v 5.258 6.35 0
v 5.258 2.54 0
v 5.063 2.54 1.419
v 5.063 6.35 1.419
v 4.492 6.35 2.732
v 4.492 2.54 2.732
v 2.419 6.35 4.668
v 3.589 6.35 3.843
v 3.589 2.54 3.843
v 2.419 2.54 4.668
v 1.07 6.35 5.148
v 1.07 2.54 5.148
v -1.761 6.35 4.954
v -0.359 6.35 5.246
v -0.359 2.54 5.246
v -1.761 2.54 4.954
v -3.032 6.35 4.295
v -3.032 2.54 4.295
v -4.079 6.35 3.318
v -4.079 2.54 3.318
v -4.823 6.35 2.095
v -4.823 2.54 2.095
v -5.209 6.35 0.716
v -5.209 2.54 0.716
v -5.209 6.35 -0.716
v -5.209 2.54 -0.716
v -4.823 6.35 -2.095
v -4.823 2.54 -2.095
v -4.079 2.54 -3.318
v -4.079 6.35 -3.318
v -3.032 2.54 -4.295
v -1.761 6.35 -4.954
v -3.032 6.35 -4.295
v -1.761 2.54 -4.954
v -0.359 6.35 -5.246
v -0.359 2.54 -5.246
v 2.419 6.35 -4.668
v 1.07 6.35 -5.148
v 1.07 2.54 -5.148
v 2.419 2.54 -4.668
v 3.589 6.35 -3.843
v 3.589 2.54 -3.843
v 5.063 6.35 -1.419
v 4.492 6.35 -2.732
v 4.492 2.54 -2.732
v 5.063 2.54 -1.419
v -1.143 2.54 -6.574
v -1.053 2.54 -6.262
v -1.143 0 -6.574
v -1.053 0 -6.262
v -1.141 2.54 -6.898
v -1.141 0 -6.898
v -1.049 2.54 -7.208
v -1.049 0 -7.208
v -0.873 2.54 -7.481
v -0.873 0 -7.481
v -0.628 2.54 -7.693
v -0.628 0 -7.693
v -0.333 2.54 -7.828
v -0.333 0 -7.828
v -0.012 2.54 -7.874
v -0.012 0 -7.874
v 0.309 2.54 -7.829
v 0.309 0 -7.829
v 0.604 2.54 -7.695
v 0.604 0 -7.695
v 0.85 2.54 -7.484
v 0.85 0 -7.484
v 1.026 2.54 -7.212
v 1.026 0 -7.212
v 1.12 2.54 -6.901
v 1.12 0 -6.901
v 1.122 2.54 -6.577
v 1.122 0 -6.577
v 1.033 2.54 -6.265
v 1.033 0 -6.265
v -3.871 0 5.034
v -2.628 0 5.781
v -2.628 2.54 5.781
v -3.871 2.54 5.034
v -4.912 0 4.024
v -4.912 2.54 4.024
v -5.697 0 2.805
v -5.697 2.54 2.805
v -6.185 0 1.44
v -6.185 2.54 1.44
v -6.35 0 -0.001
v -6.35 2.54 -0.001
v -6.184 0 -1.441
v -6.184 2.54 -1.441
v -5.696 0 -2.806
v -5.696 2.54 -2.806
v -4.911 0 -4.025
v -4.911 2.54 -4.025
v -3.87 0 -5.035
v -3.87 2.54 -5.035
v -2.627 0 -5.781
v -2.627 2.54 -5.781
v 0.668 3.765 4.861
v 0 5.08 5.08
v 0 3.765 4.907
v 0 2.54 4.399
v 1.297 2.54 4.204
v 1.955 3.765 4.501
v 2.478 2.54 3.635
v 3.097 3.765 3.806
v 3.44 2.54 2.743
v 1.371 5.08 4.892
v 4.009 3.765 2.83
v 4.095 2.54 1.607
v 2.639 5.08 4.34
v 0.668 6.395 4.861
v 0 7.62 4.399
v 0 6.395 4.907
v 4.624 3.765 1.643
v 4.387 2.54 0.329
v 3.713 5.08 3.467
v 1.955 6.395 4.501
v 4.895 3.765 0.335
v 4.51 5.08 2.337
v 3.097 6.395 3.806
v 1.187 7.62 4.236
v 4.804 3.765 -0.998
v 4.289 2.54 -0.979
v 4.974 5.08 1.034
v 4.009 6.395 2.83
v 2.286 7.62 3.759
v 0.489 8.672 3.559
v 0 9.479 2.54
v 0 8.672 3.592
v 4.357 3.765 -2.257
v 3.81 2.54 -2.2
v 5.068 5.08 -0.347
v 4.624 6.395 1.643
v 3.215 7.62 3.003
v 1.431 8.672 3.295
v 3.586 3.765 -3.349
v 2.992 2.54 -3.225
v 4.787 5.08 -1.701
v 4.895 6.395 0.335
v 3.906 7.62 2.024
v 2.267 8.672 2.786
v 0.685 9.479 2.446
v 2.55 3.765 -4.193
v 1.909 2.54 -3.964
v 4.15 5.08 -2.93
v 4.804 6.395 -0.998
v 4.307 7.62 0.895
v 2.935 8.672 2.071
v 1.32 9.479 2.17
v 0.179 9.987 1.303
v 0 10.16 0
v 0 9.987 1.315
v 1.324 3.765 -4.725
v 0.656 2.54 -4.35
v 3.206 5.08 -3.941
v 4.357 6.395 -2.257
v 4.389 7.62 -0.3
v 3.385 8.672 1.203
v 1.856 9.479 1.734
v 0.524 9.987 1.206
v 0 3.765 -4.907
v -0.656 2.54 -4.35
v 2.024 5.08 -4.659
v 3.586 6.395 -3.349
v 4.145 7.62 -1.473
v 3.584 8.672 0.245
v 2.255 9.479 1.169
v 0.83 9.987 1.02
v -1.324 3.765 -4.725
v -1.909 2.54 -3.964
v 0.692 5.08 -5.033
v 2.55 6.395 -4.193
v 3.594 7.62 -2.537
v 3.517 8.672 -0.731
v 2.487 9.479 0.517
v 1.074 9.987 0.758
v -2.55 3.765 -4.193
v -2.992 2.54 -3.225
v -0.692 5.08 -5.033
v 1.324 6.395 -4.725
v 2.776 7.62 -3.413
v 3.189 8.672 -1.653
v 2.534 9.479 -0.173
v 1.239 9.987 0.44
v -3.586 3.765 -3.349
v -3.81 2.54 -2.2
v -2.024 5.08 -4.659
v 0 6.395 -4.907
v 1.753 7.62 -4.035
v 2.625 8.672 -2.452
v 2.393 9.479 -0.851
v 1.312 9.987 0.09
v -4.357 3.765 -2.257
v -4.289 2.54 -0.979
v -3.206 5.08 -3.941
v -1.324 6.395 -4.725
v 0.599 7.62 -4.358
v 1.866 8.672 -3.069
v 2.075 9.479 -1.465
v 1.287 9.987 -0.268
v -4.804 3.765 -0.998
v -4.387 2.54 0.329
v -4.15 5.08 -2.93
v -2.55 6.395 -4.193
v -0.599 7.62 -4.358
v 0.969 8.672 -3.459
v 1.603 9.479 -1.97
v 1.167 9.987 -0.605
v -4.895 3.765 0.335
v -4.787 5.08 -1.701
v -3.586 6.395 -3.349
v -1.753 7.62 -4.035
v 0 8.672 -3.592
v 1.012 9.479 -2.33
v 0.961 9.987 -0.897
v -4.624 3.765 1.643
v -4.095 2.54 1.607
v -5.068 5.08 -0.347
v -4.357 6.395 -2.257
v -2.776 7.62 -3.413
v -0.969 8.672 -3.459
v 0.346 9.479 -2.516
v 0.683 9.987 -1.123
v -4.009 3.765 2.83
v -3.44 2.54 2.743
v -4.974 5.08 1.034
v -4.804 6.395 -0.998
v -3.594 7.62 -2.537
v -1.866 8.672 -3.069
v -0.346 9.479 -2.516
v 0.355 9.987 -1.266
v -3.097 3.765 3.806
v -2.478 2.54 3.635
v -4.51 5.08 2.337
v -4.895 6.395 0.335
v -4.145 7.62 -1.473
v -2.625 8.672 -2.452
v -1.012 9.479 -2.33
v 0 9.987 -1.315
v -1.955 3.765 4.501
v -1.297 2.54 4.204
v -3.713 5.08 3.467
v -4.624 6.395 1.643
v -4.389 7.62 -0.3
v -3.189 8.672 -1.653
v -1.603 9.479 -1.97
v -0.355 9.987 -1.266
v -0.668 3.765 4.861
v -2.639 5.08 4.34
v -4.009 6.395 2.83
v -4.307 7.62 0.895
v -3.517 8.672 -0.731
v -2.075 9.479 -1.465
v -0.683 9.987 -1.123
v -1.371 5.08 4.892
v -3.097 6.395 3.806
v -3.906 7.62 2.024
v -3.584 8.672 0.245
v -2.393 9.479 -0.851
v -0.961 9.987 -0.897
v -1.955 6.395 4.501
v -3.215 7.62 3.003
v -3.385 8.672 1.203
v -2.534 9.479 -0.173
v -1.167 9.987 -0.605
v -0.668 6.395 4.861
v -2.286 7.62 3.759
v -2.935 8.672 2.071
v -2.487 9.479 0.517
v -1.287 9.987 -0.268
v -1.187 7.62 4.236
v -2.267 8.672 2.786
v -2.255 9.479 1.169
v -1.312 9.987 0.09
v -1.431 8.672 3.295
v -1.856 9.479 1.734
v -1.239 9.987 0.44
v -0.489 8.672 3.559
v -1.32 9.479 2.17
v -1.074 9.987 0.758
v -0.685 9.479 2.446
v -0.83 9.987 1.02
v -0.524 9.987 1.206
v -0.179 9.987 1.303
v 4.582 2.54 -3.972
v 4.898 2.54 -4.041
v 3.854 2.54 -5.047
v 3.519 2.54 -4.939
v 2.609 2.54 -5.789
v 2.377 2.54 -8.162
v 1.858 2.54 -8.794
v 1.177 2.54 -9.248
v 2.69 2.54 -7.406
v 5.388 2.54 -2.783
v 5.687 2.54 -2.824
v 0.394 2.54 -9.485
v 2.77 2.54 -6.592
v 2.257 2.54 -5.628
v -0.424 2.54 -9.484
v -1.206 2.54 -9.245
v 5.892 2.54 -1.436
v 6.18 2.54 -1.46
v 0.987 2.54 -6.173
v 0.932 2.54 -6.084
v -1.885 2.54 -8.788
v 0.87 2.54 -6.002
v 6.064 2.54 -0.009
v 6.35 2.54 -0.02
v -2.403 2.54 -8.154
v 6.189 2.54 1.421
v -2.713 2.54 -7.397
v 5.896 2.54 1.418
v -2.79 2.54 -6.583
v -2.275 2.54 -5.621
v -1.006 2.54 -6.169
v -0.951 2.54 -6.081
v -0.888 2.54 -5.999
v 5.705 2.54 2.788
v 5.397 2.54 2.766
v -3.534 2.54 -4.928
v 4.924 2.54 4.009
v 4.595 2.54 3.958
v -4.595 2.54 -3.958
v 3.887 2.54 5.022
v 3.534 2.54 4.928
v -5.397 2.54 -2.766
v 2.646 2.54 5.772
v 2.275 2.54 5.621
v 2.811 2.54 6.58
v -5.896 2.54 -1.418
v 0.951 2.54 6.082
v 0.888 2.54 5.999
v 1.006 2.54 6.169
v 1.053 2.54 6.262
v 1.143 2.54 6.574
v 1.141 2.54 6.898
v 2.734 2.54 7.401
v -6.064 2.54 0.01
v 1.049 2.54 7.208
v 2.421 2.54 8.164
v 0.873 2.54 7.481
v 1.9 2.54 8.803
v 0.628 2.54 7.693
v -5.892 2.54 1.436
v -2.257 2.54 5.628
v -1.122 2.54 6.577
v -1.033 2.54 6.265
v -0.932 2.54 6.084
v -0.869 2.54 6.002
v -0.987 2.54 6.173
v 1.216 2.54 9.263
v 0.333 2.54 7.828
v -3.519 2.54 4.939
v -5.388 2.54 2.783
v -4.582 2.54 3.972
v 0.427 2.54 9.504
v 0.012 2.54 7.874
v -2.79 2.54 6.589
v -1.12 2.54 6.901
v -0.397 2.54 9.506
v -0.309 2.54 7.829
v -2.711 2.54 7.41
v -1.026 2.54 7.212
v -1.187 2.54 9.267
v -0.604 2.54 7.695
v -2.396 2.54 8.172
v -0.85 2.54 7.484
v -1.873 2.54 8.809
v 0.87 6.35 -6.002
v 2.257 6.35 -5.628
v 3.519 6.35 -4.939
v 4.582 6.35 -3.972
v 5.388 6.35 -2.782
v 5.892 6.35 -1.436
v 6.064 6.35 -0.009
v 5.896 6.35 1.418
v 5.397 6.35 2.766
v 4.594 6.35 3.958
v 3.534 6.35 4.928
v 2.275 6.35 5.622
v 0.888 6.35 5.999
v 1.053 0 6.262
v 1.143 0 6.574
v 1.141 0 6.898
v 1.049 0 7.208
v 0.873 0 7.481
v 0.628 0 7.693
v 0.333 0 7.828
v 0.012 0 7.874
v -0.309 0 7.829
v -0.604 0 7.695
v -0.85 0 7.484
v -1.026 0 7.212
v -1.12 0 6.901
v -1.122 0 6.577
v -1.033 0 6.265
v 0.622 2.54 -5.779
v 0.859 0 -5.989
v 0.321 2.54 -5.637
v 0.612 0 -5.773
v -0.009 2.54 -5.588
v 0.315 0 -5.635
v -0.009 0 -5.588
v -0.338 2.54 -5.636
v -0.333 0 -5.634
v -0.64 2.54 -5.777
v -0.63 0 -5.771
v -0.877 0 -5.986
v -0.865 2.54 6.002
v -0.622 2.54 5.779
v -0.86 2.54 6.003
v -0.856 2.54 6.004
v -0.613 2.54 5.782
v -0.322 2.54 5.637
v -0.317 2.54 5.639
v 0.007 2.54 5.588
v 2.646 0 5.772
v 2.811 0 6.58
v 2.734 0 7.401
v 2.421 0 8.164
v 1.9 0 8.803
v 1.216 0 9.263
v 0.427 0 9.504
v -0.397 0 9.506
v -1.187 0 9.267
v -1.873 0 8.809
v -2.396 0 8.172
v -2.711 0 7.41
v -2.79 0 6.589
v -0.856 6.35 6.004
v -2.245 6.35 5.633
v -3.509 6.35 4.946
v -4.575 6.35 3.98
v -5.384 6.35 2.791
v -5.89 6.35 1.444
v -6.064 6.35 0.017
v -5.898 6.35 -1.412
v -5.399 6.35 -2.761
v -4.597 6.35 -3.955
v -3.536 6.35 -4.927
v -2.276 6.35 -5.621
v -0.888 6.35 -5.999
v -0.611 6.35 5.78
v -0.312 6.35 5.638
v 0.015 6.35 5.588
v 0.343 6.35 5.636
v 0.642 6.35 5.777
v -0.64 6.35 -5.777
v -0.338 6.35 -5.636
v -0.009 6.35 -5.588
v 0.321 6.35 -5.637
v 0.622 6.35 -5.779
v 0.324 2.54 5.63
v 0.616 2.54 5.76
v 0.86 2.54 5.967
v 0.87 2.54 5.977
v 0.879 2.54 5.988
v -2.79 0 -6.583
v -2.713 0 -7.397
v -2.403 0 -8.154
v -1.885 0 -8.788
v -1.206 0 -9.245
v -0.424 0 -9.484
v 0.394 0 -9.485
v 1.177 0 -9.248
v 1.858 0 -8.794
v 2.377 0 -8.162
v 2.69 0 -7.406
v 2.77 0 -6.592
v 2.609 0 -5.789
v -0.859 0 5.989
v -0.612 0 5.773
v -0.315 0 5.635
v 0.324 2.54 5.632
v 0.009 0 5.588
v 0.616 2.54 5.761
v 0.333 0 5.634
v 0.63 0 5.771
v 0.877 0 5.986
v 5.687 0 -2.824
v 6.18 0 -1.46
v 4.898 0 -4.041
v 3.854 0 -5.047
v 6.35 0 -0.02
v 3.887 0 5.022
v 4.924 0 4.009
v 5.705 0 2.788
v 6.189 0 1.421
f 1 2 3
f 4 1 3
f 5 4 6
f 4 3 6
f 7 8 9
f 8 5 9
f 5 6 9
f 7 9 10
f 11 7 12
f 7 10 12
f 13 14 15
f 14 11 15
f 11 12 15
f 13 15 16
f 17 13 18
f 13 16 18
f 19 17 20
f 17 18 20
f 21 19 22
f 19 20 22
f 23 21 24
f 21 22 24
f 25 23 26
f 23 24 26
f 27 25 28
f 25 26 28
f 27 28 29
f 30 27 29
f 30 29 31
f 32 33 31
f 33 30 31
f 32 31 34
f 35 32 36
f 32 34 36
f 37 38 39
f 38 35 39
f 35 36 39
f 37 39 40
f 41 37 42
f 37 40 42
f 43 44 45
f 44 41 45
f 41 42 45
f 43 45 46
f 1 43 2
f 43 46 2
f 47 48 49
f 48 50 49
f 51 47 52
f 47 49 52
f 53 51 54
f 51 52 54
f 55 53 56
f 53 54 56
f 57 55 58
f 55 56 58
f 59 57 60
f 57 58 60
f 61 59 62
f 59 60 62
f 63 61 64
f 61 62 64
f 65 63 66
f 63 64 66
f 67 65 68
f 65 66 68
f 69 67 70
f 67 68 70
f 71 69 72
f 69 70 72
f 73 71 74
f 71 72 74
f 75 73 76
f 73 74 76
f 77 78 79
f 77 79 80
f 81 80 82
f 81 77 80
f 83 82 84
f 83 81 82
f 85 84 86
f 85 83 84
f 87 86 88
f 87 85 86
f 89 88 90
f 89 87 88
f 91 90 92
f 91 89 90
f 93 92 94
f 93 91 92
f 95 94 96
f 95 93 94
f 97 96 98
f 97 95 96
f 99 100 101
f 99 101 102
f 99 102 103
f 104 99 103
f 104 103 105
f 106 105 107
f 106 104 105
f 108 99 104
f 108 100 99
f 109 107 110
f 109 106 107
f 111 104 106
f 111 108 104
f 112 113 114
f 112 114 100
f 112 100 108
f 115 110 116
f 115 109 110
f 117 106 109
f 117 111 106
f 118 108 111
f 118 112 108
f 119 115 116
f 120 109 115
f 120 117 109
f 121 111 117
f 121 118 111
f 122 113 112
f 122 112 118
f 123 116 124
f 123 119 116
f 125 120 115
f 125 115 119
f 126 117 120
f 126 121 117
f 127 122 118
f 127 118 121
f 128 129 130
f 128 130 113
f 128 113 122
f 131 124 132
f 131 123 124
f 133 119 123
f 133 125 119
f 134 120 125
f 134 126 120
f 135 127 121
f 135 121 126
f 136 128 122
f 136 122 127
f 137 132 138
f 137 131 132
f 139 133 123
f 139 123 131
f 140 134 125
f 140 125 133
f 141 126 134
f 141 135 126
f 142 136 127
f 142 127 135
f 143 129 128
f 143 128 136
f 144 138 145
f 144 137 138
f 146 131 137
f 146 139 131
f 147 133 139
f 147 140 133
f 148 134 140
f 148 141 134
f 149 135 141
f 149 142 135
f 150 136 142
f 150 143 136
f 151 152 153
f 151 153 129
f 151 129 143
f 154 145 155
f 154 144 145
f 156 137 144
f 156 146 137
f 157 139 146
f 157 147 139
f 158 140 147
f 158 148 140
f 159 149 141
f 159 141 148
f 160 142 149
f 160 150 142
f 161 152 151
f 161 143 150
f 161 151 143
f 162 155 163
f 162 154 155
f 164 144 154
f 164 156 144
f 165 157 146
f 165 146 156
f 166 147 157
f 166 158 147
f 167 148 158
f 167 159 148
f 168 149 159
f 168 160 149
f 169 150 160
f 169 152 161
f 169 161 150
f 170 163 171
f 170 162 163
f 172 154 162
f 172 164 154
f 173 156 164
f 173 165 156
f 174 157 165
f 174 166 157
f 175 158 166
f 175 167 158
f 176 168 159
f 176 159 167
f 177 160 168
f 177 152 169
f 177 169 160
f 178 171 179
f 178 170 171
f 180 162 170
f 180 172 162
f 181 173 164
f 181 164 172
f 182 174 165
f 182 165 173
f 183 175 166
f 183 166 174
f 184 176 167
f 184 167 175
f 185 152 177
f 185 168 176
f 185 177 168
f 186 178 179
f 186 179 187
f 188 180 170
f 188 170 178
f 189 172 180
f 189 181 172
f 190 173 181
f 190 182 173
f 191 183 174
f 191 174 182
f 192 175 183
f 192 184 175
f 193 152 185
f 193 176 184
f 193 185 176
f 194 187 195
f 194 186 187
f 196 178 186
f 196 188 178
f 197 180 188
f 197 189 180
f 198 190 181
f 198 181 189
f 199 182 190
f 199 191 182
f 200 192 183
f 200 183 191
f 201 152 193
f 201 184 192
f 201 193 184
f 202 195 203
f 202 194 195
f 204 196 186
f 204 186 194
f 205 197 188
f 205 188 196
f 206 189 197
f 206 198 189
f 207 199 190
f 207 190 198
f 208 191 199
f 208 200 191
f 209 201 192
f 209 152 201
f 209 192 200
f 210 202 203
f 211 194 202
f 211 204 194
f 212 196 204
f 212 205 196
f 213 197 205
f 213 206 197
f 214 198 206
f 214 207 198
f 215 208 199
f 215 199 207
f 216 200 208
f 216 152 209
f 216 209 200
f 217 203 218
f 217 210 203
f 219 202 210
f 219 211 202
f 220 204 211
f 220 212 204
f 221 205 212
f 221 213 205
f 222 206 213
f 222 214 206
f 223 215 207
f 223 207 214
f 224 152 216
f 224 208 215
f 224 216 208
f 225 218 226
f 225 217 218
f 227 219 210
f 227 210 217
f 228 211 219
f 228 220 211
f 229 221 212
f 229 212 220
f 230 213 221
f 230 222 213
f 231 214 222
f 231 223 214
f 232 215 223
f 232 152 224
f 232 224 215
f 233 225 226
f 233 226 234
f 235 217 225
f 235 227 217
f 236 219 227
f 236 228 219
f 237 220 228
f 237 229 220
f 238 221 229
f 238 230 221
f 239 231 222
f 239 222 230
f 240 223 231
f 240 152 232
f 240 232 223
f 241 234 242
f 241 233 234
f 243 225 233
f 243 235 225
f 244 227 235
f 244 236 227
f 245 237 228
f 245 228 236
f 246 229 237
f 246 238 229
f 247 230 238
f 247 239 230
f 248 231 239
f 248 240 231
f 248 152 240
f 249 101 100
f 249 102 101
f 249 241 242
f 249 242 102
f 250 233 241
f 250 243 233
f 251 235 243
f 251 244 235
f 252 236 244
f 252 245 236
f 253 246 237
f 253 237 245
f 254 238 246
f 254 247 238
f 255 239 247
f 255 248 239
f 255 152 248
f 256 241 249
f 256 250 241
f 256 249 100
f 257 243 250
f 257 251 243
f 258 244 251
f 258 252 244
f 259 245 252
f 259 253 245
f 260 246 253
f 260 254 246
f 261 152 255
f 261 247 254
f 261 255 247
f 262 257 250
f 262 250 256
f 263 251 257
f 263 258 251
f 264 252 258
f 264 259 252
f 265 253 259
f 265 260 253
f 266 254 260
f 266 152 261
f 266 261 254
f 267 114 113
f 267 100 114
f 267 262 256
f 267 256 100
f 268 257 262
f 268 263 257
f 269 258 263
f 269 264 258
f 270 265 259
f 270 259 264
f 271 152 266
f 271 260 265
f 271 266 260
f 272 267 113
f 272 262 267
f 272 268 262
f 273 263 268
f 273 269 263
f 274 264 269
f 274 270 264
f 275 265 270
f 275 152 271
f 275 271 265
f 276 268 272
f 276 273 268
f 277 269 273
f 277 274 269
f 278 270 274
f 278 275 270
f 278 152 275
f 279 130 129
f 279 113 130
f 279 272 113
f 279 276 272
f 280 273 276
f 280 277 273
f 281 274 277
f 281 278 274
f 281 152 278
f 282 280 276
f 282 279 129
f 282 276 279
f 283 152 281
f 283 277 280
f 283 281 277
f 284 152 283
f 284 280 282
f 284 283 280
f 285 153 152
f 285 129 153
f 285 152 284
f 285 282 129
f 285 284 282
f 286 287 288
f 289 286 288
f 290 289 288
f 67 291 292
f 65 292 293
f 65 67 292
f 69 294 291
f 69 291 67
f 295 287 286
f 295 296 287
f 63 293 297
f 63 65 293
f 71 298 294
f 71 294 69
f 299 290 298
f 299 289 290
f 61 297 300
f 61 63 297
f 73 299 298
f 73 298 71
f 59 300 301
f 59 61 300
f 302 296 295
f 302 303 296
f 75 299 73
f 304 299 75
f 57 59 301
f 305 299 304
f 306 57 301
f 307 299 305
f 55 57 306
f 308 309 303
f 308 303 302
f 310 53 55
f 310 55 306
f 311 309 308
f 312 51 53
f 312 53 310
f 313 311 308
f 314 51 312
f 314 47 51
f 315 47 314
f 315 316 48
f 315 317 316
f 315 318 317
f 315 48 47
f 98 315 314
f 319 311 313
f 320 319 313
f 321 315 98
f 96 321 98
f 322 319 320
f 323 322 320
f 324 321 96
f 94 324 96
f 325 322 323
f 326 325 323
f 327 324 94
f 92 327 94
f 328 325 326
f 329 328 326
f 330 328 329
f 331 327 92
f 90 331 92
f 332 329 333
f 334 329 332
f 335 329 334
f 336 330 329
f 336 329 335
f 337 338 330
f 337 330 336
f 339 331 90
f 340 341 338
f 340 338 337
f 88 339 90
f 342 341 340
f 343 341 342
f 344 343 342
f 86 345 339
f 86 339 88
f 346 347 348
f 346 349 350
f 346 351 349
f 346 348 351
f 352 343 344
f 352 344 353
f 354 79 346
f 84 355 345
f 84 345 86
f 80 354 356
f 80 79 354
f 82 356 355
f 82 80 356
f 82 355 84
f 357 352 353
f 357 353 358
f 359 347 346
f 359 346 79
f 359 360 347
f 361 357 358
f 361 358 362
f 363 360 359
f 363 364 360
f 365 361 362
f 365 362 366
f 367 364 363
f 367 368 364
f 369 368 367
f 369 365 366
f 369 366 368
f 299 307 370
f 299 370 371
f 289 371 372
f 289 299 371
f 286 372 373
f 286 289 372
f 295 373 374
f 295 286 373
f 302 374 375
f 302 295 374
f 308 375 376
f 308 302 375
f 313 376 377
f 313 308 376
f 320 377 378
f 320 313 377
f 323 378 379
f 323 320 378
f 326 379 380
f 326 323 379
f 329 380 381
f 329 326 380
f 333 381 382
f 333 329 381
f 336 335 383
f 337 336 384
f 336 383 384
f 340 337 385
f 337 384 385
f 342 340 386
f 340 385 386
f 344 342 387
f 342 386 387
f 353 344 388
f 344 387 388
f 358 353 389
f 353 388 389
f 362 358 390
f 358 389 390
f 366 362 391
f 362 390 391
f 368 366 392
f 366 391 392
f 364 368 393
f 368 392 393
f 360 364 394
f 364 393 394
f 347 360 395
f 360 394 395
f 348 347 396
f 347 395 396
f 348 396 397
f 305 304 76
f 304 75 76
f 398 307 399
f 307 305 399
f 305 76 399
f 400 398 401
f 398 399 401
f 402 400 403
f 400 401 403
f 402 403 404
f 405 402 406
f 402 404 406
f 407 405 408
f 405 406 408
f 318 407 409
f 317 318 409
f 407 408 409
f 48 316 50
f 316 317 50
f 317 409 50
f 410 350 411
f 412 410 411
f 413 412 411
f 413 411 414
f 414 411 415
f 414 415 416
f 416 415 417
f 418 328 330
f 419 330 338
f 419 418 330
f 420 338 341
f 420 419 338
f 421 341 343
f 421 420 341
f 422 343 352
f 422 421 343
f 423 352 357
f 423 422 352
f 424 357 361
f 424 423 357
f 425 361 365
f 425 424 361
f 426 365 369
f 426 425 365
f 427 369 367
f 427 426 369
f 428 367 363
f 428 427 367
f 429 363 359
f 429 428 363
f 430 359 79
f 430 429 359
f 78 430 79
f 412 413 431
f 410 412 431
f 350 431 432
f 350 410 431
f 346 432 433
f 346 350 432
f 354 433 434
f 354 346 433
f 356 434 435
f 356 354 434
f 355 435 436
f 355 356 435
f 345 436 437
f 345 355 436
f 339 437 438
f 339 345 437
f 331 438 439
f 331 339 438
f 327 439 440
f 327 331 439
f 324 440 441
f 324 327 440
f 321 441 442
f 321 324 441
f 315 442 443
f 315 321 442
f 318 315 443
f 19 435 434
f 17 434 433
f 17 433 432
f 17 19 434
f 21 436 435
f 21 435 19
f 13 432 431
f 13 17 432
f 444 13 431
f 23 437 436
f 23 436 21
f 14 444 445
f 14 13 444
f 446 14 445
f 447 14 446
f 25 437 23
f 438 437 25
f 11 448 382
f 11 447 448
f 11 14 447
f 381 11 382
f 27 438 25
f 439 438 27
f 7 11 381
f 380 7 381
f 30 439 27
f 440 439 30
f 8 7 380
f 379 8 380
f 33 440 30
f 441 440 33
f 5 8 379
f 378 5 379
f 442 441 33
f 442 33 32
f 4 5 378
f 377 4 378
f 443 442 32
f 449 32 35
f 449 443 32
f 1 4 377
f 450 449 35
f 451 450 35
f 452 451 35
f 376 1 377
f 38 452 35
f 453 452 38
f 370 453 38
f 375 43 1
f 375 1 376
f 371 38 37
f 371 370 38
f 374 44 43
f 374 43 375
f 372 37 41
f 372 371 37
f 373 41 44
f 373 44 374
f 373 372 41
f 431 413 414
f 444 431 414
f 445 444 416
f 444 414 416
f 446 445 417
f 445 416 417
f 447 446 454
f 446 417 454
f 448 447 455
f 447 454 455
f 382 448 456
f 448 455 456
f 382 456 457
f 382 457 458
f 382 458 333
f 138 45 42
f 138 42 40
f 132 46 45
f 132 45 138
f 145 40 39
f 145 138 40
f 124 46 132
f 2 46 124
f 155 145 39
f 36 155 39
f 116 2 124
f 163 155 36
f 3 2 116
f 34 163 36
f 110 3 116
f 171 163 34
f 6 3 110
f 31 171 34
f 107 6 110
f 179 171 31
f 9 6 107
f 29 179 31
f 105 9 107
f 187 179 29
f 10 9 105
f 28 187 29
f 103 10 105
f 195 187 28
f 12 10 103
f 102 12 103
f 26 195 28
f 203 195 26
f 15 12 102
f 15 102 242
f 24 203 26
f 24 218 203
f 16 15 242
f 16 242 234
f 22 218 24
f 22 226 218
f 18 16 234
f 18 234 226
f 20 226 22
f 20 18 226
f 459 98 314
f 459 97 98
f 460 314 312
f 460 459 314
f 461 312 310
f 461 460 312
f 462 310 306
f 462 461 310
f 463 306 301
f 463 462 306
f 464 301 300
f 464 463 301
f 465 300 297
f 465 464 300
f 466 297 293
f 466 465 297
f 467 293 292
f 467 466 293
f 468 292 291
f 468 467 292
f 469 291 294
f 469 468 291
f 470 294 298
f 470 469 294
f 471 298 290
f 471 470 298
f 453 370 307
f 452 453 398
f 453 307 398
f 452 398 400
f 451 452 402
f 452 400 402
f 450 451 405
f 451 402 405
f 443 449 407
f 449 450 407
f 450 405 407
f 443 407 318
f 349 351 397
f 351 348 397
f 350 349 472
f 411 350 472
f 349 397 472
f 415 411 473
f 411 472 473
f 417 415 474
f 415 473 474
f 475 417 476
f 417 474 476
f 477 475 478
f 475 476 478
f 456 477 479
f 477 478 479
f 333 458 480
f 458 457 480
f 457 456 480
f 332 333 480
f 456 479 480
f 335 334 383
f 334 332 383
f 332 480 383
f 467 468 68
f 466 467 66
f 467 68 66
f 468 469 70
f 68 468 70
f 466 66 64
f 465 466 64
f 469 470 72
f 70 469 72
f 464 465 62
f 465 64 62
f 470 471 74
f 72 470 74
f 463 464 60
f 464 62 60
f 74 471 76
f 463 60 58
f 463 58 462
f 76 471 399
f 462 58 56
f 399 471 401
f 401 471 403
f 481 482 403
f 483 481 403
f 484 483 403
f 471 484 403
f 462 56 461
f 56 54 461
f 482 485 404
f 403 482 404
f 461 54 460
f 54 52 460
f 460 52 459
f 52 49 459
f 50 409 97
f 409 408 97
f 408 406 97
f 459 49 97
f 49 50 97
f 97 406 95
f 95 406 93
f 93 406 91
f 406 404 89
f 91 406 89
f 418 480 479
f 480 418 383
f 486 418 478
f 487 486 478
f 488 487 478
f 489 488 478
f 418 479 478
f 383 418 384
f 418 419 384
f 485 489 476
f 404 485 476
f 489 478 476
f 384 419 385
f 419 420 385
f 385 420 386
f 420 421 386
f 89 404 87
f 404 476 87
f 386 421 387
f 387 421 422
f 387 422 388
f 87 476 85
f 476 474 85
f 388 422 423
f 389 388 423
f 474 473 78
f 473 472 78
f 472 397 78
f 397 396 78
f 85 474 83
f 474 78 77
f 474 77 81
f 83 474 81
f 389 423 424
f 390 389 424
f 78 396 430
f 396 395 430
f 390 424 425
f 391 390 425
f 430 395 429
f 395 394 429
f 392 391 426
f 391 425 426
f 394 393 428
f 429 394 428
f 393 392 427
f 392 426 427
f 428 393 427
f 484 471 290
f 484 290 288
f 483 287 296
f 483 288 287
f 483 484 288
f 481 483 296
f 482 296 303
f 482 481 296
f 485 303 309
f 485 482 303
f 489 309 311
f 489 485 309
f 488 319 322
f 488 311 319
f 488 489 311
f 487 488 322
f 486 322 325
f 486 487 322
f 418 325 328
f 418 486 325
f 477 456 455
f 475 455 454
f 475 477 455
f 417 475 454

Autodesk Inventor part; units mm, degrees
ref_plane "YZ Plane" through (0, 0, 0) normal (1, 0, 0) x (0, 1, 0)
ref_plane "XZ Plane" through (0, 0, 0) normal (0, 1, 0) x (-1, 0, 0)
ref_plane "XY Plane" through (0, 0, 0) normal (0, 0, 1) x (1, 0, 0)
sketch "Sketch1" plane through (0, 0, 0) normal (0, 1, 0) x (-1, 0, 0)
  circle A0 centre (0, 0) radius 6.35
  circle A1 centre (0.0105, -6.731) radius 1.143
  circle A2 centre (-0.0105, 6.731) radius 1.143
  circle A3 centre (-0.0105, 6.731) radius 2.8045
  circle A4 centre (0.0105, -6.731) radius 2.7835
  line L0 (2.794, 10.5755) -> (2.794, -14.4258)
  line L1 (4.742, 9.5355) -> (-5.3201, 9.5355)
  line L2 (6.3395, -9.5145) -> (-5.3201, -9.5145)
  arc A5 (-1.0529, 6.2621) -> (1.0333, 6.2654) centre (-0.0105, 6.731) ccw
  arc A6 (1.0529, -6.2621) -> (-1.0333, -6.2654) centre (0.0105, -6.731) ccw
  dimension "d0" = 12.7
  dimension "d1" = 2.286
  dimension "d2" = 2.286
  dimension "d3" = 6.731
  dimension "d4" = 6.731
  dimension "d5" = 13.462
  dimension "d6" = 19.05
extrude "Extrusion1" add sketch "Sketch1" along normal blind 2.54 contours A2 A0 A3 | A0 A3 A2 | A0 L0 A4 A3 | A0 L0 | A4 A0 A1 | A0 A1 A4
sketch "Sketch2" plane through (0, 2.54, 0) normal (0, 1, 0) x (1, 0, 0)
  circle A0 centre (0, 0) radius 6.0643
  circle A1 centre (0, 0) radius 5.2578
  circle A2 centre (-0.0105, 6.731) radius 1.143 projected
  arc A3 (0.8695, 6.0016) -> (-0.8883, 5.9988) centre (0, 0) ccw
  arc A4 (-0.8555, -6.0036) -> (0.8879, -5.9989) centre (0, 0) ccw
  arc A5 (0.8879, -5.9989) -> (-0.8555, -6.0036) centre (0.0181, -6.7139) ccw
  arc A6 (-0.8883, 5.9988) -> (0.8695, 6.0016) centre (-0.0105, 6.731) ccw
  line L0 (0, 0) -> (0.8695, 0)
  line L1 (0.8695, 0) -> (0.8695, 1.0578)
  line L2 (0.8695, 1.0578) -> (0, 1.0578)
  line L3 (0, 1.0578) -> (0, 0)
extrude "Extrusion2" add sketch "Sketch2" along normal blind 3.81 contours A0 A5 A2 | L3 L2 L1 L0
sketch "Sketch3" plane through (0, 2.54, -1.0578) normal (-1, 0, 0) x (0, 0, 1)
  circle A0 centre (1.0578, 2.54) radius 5.08
  line L0 (1.0578, 7.62) -> (7.9844, 7.62)
  line L1 (6.8385, -2.54) -> (-4.7233, -2.54) projected
  line L2 (1.0578, 7.62) -> (1.0578, 0)
  line L3 (1.0578, 7.62) -> (1.0578, -2.54)
  dimension "d11" = 10.16
  dimension "d12" = 10.16
revolve "Revolution1" add sketch "Sketch3" angle 360 about axis through (0, 10.16, 0) along (0, -1, 0) picked at (1.4346, 5.0375) contours A0 L3 L2
properties part number "BallCaster"
